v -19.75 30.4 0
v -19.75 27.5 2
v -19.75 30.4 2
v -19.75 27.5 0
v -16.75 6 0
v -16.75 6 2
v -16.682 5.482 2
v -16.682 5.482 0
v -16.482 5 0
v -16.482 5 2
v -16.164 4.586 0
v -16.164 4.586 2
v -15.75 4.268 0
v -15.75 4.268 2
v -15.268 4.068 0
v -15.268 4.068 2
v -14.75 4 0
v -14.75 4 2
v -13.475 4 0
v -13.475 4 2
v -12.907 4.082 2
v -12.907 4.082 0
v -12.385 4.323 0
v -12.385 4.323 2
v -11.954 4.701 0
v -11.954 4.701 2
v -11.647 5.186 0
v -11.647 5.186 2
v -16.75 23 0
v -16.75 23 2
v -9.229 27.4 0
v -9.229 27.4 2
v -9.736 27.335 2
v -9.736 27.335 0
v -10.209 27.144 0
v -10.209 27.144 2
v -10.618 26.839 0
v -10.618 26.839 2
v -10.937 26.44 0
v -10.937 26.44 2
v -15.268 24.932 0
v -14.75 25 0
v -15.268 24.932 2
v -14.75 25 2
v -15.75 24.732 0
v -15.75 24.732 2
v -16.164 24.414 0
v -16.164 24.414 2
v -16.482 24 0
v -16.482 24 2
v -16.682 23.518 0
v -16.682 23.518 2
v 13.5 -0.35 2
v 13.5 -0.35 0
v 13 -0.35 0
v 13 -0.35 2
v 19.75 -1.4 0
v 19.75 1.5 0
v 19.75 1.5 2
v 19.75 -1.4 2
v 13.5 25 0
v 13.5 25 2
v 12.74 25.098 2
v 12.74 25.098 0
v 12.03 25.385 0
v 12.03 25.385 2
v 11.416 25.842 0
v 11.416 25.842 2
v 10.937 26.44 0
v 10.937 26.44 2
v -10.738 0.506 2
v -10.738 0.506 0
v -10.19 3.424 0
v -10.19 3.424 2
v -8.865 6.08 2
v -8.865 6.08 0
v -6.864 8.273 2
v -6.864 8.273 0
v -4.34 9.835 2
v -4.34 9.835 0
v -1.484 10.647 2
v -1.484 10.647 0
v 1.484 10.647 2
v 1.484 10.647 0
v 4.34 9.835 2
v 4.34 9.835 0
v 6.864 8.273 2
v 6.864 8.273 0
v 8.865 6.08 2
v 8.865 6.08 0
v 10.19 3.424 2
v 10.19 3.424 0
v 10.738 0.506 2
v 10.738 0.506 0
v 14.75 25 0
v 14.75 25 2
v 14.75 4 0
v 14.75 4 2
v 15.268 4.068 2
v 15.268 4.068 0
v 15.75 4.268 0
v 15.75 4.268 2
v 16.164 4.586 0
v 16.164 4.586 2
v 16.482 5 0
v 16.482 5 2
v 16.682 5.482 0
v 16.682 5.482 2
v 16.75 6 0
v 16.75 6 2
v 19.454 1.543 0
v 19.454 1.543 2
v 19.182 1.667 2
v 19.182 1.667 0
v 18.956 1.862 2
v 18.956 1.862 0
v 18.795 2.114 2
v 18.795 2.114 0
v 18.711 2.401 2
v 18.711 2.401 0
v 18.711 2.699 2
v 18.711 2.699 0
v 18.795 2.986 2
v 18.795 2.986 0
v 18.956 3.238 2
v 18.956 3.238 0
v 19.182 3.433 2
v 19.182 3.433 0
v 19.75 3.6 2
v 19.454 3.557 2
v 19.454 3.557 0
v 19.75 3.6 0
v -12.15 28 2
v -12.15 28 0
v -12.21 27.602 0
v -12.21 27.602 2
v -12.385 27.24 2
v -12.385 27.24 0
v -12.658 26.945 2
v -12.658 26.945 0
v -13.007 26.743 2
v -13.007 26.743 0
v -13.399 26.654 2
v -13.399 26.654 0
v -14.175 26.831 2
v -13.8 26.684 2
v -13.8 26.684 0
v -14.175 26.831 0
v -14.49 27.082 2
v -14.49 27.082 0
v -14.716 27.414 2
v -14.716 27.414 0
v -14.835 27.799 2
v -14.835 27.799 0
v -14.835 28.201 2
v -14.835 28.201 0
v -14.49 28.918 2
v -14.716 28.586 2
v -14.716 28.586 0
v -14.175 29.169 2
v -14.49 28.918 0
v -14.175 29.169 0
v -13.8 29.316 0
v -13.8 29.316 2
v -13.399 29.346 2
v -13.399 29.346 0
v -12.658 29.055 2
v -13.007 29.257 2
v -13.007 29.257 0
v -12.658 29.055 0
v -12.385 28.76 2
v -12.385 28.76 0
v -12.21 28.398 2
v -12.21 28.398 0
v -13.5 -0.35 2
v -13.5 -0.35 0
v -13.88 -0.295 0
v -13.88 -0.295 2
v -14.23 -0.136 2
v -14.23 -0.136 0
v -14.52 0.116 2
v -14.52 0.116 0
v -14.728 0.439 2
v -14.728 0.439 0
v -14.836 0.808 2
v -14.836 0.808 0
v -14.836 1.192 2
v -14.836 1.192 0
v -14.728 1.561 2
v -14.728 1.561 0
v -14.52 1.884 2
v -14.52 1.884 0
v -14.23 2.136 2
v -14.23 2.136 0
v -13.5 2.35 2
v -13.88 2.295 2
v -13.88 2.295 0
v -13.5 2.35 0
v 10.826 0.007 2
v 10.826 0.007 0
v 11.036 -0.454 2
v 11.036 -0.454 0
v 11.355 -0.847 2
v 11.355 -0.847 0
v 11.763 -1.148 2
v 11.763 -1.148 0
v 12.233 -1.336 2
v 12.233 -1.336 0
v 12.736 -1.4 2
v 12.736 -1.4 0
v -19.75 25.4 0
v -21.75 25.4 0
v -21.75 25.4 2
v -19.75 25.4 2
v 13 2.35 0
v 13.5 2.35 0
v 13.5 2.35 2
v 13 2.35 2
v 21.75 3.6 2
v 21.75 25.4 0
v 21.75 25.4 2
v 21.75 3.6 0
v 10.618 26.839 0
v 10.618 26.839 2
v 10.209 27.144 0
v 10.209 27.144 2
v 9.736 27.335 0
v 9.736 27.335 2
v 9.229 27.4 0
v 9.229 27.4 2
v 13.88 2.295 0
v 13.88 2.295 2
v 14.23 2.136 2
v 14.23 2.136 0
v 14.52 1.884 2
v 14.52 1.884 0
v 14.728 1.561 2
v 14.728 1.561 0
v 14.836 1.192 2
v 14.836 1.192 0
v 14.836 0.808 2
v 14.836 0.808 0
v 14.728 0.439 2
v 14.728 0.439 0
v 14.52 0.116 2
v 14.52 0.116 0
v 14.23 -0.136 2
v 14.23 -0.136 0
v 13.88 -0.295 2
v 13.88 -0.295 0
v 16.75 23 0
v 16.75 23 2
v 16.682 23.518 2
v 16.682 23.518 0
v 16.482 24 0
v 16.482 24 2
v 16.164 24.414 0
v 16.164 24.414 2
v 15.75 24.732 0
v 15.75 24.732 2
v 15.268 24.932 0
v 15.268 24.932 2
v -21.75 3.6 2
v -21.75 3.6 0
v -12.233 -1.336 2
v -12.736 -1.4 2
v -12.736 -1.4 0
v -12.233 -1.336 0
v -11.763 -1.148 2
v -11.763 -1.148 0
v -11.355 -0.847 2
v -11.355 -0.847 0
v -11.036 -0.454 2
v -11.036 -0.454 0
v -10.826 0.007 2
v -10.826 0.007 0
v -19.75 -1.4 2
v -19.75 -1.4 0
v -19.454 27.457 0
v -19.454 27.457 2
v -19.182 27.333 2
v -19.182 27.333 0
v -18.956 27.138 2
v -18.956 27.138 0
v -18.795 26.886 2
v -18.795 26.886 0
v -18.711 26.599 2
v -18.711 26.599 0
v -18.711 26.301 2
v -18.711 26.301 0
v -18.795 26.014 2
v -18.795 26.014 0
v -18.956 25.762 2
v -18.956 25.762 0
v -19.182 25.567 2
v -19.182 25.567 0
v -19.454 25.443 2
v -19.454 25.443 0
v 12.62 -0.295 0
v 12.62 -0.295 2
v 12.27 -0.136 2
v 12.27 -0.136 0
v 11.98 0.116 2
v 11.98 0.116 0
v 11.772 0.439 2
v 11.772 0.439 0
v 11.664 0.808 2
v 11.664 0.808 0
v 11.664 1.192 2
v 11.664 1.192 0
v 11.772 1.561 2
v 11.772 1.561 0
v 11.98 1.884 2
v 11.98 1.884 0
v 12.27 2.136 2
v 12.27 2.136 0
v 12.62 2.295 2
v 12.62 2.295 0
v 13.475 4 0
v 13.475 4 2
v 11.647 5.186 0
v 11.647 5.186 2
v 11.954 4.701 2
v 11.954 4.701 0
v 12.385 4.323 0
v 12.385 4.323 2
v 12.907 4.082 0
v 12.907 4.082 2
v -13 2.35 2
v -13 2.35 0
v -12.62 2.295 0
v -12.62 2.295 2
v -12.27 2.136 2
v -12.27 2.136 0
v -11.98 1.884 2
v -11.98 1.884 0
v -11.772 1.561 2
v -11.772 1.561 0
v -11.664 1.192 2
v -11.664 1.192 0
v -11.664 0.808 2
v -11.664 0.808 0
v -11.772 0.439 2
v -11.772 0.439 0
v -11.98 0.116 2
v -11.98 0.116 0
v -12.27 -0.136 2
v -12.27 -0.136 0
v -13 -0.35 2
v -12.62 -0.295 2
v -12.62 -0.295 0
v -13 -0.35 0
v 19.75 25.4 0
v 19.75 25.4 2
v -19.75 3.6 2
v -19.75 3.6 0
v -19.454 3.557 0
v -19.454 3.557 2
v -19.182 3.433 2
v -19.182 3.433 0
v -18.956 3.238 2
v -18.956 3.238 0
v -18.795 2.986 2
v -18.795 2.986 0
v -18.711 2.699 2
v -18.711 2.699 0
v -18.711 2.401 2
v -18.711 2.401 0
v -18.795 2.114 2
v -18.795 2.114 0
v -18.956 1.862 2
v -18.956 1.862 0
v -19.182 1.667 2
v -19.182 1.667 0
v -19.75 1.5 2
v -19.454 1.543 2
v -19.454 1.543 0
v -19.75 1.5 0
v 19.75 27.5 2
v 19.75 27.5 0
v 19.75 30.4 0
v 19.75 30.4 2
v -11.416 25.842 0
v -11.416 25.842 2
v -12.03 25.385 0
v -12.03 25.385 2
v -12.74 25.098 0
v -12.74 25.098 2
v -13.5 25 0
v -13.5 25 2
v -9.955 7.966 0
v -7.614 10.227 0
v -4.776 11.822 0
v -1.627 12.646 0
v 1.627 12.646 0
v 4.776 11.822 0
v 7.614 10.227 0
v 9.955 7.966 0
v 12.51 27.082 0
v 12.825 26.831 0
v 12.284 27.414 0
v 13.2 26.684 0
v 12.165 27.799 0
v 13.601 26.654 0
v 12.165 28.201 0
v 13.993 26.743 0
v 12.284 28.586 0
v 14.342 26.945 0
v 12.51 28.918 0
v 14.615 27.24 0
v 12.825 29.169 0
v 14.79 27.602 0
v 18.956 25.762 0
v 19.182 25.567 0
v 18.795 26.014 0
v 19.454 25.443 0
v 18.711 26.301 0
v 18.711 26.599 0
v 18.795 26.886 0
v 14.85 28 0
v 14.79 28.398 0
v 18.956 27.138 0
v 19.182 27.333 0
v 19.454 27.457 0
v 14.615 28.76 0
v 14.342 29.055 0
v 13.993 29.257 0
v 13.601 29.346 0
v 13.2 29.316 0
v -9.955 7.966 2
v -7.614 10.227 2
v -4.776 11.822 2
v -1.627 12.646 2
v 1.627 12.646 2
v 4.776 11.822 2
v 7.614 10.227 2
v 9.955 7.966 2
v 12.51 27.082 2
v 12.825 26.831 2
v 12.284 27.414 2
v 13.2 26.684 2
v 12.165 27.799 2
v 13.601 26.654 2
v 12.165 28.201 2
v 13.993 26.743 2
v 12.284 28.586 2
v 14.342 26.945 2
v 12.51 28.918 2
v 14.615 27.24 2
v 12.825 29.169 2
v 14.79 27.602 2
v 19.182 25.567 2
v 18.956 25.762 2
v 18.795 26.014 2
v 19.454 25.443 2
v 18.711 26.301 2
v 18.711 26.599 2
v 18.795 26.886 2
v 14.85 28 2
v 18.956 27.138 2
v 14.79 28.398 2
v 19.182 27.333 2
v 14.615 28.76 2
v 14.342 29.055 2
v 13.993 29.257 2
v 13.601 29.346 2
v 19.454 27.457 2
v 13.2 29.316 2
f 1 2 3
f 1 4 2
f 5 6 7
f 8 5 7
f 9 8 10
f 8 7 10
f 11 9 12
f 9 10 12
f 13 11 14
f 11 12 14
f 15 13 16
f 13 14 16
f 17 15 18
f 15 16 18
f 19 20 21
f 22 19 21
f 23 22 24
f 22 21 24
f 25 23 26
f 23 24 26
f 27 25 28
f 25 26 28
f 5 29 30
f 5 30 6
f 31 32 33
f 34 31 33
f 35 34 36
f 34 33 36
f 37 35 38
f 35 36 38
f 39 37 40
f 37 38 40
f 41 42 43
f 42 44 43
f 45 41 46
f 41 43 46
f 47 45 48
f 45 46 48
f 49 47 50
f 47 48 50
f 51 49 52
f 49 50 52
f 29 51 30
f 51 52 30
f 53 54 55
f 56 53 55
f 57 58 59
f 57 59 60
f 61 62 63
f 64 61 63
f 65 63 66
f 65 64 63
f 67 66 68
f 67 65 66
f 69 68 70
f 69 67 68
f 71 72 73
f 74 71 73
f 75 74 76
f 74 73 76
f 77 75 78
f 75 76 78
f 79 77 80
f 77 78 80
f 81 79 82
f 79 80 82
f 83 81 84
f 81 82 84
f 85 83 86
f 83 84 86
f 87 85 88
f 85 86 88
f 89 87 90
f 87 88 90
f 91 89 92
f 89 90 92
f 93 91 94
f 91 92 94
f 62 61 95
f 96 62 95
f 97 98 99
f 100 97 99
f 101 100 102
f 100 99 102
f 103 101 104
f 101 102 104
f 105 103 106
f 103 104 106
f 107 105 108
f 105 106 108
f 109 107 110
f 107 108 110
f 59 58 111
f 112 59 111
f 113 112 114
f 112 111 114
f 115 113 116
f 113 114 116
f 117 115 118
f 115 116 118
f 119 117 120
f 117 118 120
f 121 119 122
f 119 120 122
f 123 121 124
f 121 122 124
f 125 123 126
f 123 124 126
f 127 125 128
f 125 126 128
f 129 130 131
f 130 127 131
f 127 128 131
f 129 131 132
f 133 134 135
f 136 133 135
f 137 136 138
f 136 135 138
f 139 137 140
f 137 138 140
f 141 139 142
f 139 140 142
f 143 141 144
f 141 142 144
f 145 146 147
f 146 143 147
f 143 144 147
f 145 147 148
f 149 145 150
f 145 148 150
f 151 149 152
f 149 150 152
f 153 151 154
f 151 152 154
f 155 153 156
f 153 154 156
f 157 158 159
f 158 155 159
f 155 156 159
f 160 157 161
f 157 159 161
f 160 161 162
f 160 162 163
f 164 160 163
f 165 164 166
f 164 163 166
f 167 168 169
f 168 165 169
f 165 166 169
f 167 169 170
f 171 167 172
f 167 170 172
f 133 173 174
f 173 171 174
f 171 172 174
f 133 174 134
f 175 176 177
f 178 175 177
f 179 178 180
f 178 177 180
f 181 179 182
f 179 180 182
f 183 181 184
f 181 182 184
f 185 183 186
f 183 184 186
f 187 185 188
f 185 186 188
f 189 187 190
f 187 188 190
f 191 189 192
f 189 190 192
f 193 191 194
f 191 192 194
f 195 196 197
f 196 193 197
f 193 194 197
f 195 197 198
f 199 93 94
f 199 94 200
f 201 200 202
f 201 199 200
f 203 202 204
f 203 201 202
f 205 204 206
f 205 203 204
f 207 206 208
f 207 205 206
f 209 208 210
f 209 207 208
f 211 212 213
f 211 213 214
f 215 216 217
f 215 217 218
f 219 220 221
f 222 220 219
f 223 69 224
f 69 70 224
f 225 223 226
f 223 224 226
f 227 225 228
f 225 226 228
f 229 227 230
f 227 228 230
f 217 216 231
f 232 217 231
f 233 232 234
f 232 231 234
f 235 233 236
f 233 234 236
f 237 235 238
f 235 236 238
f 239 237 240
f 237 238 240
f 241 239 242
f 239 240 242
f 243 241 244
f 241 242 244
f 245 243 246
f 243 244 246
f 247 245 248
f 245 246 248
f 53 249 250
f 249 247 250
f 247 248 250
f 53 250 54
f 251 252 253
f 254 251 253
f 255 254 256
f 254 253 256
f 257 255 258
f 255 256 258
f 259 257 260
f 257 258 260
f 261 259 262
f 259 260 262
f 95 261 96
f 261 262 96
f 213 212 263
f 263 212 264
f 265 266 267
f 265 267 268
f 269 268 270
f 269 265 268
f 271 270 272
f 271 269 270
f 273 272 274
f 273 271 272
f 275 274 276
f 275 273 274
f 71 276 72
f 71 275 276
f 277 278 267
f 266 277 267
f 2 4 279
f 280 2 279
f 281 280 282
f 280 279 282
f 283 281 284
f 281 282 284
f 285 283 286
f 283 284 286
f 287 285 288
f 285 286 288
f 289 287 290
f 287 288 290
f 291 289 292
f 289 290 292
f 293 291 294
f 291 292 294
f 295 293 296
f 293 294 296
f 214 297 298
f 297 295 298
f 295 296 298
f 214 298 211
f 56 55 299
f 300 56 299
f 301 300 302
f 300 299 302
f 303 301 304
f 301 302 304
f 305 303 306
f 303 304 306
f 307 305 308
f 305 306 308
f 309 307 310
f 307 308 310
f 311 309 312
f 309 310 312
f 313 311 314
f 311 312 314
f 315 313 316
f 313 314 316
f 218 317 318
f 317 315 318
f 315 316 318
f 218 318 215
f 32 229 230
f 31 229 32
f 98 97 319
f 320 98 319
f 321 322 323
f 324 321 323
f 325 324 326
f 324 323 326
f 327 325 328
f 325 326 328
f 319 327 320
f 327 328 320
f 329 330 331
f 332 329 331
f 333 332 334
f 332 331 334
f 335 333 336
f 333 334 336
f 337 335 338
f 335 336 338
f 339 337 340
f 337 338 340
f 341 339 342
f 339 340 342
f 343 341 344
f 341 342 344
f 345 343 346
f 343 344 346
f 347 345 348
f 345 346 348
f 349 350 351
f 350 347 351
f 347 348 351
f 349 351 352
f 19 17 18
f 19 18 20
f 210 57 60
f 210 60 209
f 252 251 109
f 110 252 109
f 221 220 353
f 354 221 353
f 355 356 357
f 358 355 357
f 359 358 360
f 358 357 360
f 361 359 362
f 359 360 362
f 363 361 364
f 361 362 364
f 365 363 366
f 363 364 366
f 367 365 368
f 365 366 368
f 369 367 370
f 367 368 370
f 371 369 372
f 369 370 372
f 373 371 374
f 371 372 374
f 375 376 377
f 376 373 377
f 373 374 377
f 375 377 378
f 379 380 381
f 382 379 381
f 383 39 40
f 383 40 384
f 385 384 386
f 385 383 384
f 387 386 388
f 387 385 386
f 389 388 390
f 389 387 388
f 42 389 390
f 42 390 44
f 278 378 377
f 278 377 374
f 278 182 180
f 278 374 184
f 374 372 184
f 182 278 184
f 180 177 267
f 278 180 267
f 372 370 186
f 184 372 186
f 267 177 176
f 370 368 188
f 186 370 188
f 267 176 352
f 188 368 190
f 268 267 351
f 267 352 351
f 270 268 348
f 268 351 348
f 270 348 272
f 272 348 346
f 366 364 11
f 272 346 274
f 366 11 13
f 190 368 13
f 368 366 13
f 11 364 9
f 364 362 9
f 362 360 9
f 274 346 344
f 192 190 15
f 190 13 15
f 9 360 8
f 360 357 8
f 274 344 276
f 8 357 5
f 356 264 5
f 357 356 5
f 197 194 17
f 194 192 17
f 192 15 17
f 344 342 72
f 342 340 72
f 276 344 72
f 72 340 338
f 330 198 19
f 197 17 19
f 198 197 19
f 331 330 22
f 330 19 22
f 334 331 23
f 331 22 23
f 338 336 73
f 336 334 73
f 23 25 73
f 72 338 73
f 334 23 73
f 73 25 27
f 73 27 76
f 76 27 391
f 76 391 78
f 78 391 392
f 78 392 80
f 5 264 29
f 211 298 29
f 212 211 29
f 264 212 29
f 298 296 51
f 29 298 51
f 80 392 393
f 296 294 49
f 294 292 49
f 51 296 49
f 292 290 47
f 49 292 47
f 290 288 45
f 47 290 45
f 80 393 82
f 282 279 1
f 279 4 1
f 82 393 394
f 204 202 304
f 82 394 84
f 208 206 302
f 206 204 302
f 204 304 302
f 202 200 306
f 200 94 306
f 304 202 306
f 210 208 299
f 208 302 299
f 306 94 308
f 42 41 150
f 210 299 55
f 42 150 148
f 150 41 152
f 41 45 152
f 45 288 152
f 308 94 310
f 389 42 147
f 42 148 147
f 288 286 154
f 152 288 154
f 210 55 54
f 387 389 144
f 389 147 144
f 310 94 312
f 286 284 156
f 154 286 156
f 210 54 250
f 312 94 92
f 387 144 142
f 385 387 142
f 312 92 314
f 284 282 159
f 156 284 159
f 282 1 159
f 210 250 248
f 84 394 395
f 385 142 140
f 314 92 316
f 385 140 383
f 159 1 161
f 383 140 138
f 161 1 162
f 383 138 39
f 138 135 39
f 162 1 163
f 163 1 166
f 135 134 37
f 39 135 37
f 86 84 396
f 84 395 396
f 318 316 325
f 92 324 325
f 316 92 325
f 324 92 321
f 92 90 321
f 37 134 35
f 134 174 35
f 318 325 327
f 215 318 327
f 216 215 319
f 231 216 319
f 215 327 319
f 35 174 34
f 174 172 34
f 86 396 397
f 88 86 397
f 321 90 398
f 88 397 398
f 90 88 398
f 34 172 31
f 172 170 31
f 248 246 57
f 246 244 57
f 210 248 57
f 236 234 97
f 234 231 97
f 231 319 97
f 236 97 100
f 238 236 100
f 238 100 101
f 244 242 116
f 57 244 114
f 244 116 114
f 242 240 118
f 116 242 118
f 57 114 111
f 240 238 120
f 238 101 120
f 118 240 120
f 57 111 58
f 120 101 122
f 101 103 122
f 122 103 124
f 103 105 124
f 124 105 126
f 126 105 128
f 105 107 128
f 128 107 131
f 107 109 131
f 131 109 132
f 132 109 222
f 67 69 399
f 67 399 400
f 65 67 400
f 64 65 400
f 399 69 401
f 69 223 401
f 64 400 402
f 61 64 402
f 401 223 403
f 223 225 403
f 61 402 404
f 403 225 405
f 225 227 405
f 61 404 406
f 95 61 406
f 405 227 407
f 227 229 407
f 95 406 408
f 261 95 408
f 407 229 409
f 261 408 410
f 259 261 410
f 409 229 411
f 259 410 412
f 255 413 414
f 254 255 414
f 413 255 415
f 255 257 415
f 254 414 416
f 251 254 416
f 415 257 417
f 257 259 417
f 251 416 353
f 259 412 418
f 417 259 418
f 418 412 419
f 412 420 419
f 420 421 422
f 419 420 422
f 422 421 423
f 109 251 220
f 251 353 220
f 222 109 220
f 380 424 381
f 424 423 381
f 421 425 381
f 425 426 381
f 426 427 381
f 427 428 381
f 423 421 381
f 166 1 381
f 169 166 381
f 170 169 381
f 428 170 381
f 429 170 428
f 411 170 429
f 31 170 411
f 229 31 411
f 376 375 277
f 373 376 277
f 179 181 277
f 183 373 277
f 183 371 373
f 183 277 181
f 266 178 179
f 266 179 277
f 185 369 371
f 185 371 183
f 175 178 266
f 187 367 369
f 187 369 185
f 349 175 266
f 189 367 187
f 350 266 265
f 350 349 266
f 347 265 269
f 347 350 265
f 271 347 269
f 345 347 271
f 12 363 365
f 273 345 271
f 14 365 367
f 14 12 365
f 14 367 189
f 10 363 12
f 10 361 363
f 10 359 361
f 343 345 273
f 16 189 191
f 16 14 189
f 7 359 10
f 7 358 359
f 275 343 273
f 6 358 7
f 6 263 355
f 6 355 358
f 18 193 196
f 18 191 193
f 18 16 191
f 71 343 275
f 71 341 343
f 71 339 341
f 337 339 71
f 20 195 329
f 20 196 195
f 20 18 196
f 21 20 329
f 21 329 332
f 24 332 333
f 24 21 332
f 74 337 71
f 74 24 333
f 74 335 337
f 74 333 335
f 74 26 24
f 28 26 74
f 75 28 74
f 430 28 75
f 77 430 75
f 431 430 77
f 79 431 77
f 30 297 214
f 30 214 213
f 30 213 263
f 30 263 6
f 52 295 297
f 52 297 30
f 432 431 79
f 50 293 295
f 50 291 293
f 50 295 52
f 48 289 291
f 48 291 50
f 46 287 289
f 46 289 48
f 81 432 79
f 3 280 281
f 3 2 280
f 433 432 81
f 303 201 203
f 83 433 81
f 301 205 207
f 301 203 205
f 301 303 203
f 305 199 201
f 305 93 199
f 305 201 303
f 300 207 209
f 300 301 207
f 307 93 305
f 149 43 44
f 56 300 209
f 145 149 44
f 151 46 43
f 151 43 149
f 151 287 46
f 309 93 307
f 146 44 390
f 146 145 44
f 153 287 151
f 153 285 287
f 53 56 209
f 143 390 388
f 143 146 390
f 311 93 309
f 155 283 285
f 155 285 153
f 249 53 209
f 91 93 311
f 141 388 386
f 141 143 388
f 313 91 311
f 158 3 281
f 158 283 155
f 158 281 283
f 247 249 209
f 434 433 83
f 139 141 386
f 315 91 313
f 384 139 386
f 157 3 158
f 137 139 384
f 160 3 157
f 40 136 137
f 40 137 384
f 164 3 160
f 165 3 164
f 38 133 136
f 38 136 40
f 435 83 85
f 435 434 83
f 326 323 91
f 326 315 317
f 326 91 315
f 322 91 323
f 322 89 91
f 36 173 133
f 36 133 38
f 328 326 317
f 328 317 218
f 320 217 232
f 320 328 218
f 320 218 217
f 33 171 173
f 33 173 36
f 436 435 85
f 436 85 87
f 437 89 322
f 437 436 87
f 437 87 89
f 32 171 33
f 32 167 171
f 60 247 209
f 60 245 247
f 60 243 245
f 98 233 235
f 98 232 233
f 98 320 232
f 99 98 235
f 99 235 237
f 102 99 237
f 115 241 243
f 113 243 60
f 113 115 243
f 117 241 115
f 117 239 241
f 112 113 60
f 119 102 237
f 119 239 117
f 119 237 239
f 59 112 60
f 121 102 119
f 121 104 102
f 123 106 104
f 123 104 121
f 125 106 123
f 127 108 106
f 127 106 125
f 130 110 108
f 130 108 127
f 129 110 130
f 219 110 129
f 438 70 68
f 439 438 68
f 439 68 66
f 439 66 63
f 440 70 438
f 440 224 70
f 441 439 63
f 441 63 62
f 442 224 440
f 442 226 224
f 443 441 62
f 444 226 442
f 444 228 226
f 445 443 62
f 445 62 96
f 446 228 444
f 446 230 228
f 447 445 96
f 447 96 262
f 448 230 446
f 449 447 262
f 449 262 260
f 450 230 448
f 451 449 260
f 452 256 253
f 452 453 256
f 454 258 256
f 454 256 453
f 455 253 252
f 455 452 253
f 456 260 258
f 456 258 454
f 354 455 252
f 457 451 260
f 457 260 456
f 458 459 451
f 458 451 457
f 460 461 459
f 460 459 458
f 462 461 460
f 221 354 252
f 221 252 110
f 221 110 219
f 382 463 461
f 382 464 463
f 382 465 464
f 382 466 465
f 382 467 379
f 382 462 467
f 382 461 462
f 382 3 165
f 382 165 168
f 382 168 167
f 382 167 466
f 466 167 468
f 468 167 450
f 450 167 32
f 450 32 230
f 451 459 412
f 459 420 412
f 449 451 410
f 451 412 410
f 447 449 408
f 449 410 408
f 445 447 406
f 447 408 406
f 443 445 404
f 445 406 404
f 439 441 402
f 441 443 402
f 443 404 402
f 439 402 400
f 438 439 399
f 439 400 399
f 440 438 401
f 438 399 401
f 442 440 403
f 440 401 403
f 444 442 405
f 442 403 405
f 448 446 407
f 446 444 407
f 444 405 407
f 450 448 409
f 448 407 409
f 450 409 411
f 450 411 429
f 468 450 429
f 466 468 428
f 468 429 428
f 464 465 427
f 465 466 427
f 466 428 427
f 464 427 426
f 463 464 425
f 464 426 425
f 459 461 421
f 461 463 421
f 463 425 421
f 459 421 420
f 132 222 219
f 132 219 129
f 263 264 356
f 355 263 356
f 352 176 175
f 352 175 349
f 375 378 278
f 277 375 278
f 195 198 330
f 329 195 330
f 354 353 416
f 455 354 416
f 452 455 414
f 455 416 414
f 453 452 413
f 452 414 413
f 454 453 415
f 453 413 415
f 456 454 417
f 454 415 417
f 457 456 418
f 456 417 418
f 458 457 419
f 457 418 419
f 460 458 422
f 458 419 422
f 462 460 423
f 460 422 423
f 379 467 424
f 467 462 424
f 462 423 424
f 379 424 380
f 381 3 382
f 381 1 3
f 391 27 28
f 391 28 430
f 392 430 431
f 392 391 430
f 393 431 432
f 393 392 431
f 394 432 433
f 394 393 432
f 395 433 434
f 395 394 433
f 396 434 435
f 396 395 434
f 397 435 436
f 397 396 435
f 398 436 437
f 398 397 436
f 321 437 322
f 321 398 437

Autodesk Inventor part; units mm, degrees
ref_plane "YZ Plane" through (0, 0, 0) normal (1, 0, 0) x (0, 1, 0)
ref_plane "XZ Plane" through (0, 0, 0) normal (0, 1, 0) x (-1, 0, 0)
ref_plane "XY Plane" through (0, 0, 0) normal (0, 0, 1) x (1, 0, 0)
sketch "スケッチ1" plane through (0, 0, 0) normal (0, 0, 1) x (1, 0, 0)
  circle A0 centre (0, 0) radius 10.5 construction
  line L0 (-13.5, 28) -> (13.5, 28) construction
  line L1 (13.5, 28) -> (13.5, 1) construction
  line L2 (13.5, 1) -> (-13.5, 1) construction
  line L3 (-13.5, 1) -> (-13.5, 28) construction
  line L4 (-13.5, 28) -> (13.5, 1) construction
  line L5 (13.5, 28) -> (-13.5, 1) construction
  line L6 (-13.5, 14.5) -> (13.5, 14.5) construction
  line L7 (0, 28) -> (0, 1) construction
  circle A1 centre (-13.5, 28) radius 1.35
  circle A2 centre (-13.5, 1) radius 2.4 construction
  circle A3 centre (-13.5, 28) radius 2.4 construction
  line L8 (-19.75, 30.4) -> (19.75, 30.4)
  line L9 (-21.75, 25.4) -> (-21.75, 3.6)
  line L10 (-21.75, 25.4) -> (-19.75, 25.4)
  arc A4 (-19.75, 25.4) -> (-19.75, 27.5) centre (-19.75, 26.45) ccw
  line L11 (-19.75, 27.5) -> (-19.75, 30.4)
  line L12 (-21.75, 3.6) -> (-19.75, 3.6)
  arc A5 (-19.75, 1.5) -> (-19.75, 3.6) centre (-19.75, 2.55) ccw
  line L13 (-19.75, 1.5) -> (-19.75, -1.4)
  line L14 (-19.75, -1.4) -> (-10.6584, -1.4)
  line L15 (21.75, 25.4) -> (21.75, 3.6)
  arc A6 (19.75, 27.5) -> (19.75, 25.4) centre (19.75, 26.45) ccw
  line L16 (19.75, 27.5) -> (19.75, 30.4)
  arc A7 (19.75, 3.6) -> (19.75, 1.5) centre (19.75, 2.55) ccw
  line L17 (21.75, 3.6) -> (19.75, 3.6)
  line L18 (19.75, 1.5) -> (19.75, -1.4)
  line L19 (19.75, -1.4) -> (10.6584, -1.4)
  line L20 (21.75, 25.4) -> (19.75, 25.4)
  arc A8 (10.6584, -1.4) -> (-10.6584, -1.4) centre (0, 0) ccw
  circle A9 centre (13.5, 28) radius 1.35
  line L21 (10.5606, 27.4) -> (-10.5606, 27.4)
  arc A10 (-13.5, 25) -> (-10.5606, 27.4) centre (-13.5, 28) ccw
  line L22 (-13.5, 25) -> (-16.75, 25)
  line L23 (-16.75, 25) -> (-16.75, 4)
  arc A11 (12.1063, 4) -> (-12.1063, 4) centre (0, 0) ccw
  line L24 (-16.75, 4) -> (-12.1063, 4)
  arc A12 (10.5606, 27.4) -> (13.5, 25) centre (13.5, 28) ccw
  line L25 (13.5, 25) -> (16.75, 25)
  line L26 (16.75, 25) -> (16.75, 4)
  line L27 (16.75, 4) -> (12.1063, 4)
  line L28 (-13.5, 2.35) -> (-13, 2.35)
  line L29 (-13.5, -0.35) -> (-13, -0.35)
  arc A13 (-13, -0.35) -> (-13, 2.35) centre (-13, 1) ccw
  arc A14 (-13.5, 2.35) -> (-13.5, -0.35) centre (-13.5, 1) ccw
  line L30 (13.5, -0.35) -> (13, -0.35)
  arc A15 (13, 2.35) -> (13, -0.35) centre (13, 1) ccw
  arc A16 (13.5, -0.35) -> (13.5, 2.35) centre (13.5, 1) ccw
  line L31 (13.5, 2.35) -> (13, 2.35)
  point P0 (0, 14.5)
  dimension "d0" = 21
  dimension "d3" = 27
  dimension "d4" = 27
  dimension "d6" = 1
  dimension "d7" = 4.8
  dimension "d8" = 2
  dimension "d9" = 1.05
  dimension "d10" = 39.5
  dimension "d11" = 5
  dimension "d12" = 5
  dimension "d13" = 21.8
  dimension "d14" = 0.25
  dimension "d15" = 3
  dimension "d16" = 3
  dimension "d17" = 3
  dimension "d18" = 2
  dimension "d24" = 2.7
  dimension "d25" = 1.35
  dimension "d26" = 0.5
extrude "押し出し1" add sketch "スケッチ1" along normal blind 2
fillet "フィレット1" radius 2 2 edges at (-10.6584, -1.4, 1) (10.6584, -1.4, 1)
fillet "フィレット2" radius 2 8 edges at (-16.75, 4, 1) (-16.75, 25, 1) (-10.5606, 27.4, 1) (10.5606, 27.4, 1) (16.75, 25, 1) (16.75, 4, 1) (12.1063, 4, 1) (-12.1063, 4, 1)
equation "\"d25\" = 0.5 * d24"
properties part number "Ankle_back_frame" material "アルミニウム 2014-T4"
